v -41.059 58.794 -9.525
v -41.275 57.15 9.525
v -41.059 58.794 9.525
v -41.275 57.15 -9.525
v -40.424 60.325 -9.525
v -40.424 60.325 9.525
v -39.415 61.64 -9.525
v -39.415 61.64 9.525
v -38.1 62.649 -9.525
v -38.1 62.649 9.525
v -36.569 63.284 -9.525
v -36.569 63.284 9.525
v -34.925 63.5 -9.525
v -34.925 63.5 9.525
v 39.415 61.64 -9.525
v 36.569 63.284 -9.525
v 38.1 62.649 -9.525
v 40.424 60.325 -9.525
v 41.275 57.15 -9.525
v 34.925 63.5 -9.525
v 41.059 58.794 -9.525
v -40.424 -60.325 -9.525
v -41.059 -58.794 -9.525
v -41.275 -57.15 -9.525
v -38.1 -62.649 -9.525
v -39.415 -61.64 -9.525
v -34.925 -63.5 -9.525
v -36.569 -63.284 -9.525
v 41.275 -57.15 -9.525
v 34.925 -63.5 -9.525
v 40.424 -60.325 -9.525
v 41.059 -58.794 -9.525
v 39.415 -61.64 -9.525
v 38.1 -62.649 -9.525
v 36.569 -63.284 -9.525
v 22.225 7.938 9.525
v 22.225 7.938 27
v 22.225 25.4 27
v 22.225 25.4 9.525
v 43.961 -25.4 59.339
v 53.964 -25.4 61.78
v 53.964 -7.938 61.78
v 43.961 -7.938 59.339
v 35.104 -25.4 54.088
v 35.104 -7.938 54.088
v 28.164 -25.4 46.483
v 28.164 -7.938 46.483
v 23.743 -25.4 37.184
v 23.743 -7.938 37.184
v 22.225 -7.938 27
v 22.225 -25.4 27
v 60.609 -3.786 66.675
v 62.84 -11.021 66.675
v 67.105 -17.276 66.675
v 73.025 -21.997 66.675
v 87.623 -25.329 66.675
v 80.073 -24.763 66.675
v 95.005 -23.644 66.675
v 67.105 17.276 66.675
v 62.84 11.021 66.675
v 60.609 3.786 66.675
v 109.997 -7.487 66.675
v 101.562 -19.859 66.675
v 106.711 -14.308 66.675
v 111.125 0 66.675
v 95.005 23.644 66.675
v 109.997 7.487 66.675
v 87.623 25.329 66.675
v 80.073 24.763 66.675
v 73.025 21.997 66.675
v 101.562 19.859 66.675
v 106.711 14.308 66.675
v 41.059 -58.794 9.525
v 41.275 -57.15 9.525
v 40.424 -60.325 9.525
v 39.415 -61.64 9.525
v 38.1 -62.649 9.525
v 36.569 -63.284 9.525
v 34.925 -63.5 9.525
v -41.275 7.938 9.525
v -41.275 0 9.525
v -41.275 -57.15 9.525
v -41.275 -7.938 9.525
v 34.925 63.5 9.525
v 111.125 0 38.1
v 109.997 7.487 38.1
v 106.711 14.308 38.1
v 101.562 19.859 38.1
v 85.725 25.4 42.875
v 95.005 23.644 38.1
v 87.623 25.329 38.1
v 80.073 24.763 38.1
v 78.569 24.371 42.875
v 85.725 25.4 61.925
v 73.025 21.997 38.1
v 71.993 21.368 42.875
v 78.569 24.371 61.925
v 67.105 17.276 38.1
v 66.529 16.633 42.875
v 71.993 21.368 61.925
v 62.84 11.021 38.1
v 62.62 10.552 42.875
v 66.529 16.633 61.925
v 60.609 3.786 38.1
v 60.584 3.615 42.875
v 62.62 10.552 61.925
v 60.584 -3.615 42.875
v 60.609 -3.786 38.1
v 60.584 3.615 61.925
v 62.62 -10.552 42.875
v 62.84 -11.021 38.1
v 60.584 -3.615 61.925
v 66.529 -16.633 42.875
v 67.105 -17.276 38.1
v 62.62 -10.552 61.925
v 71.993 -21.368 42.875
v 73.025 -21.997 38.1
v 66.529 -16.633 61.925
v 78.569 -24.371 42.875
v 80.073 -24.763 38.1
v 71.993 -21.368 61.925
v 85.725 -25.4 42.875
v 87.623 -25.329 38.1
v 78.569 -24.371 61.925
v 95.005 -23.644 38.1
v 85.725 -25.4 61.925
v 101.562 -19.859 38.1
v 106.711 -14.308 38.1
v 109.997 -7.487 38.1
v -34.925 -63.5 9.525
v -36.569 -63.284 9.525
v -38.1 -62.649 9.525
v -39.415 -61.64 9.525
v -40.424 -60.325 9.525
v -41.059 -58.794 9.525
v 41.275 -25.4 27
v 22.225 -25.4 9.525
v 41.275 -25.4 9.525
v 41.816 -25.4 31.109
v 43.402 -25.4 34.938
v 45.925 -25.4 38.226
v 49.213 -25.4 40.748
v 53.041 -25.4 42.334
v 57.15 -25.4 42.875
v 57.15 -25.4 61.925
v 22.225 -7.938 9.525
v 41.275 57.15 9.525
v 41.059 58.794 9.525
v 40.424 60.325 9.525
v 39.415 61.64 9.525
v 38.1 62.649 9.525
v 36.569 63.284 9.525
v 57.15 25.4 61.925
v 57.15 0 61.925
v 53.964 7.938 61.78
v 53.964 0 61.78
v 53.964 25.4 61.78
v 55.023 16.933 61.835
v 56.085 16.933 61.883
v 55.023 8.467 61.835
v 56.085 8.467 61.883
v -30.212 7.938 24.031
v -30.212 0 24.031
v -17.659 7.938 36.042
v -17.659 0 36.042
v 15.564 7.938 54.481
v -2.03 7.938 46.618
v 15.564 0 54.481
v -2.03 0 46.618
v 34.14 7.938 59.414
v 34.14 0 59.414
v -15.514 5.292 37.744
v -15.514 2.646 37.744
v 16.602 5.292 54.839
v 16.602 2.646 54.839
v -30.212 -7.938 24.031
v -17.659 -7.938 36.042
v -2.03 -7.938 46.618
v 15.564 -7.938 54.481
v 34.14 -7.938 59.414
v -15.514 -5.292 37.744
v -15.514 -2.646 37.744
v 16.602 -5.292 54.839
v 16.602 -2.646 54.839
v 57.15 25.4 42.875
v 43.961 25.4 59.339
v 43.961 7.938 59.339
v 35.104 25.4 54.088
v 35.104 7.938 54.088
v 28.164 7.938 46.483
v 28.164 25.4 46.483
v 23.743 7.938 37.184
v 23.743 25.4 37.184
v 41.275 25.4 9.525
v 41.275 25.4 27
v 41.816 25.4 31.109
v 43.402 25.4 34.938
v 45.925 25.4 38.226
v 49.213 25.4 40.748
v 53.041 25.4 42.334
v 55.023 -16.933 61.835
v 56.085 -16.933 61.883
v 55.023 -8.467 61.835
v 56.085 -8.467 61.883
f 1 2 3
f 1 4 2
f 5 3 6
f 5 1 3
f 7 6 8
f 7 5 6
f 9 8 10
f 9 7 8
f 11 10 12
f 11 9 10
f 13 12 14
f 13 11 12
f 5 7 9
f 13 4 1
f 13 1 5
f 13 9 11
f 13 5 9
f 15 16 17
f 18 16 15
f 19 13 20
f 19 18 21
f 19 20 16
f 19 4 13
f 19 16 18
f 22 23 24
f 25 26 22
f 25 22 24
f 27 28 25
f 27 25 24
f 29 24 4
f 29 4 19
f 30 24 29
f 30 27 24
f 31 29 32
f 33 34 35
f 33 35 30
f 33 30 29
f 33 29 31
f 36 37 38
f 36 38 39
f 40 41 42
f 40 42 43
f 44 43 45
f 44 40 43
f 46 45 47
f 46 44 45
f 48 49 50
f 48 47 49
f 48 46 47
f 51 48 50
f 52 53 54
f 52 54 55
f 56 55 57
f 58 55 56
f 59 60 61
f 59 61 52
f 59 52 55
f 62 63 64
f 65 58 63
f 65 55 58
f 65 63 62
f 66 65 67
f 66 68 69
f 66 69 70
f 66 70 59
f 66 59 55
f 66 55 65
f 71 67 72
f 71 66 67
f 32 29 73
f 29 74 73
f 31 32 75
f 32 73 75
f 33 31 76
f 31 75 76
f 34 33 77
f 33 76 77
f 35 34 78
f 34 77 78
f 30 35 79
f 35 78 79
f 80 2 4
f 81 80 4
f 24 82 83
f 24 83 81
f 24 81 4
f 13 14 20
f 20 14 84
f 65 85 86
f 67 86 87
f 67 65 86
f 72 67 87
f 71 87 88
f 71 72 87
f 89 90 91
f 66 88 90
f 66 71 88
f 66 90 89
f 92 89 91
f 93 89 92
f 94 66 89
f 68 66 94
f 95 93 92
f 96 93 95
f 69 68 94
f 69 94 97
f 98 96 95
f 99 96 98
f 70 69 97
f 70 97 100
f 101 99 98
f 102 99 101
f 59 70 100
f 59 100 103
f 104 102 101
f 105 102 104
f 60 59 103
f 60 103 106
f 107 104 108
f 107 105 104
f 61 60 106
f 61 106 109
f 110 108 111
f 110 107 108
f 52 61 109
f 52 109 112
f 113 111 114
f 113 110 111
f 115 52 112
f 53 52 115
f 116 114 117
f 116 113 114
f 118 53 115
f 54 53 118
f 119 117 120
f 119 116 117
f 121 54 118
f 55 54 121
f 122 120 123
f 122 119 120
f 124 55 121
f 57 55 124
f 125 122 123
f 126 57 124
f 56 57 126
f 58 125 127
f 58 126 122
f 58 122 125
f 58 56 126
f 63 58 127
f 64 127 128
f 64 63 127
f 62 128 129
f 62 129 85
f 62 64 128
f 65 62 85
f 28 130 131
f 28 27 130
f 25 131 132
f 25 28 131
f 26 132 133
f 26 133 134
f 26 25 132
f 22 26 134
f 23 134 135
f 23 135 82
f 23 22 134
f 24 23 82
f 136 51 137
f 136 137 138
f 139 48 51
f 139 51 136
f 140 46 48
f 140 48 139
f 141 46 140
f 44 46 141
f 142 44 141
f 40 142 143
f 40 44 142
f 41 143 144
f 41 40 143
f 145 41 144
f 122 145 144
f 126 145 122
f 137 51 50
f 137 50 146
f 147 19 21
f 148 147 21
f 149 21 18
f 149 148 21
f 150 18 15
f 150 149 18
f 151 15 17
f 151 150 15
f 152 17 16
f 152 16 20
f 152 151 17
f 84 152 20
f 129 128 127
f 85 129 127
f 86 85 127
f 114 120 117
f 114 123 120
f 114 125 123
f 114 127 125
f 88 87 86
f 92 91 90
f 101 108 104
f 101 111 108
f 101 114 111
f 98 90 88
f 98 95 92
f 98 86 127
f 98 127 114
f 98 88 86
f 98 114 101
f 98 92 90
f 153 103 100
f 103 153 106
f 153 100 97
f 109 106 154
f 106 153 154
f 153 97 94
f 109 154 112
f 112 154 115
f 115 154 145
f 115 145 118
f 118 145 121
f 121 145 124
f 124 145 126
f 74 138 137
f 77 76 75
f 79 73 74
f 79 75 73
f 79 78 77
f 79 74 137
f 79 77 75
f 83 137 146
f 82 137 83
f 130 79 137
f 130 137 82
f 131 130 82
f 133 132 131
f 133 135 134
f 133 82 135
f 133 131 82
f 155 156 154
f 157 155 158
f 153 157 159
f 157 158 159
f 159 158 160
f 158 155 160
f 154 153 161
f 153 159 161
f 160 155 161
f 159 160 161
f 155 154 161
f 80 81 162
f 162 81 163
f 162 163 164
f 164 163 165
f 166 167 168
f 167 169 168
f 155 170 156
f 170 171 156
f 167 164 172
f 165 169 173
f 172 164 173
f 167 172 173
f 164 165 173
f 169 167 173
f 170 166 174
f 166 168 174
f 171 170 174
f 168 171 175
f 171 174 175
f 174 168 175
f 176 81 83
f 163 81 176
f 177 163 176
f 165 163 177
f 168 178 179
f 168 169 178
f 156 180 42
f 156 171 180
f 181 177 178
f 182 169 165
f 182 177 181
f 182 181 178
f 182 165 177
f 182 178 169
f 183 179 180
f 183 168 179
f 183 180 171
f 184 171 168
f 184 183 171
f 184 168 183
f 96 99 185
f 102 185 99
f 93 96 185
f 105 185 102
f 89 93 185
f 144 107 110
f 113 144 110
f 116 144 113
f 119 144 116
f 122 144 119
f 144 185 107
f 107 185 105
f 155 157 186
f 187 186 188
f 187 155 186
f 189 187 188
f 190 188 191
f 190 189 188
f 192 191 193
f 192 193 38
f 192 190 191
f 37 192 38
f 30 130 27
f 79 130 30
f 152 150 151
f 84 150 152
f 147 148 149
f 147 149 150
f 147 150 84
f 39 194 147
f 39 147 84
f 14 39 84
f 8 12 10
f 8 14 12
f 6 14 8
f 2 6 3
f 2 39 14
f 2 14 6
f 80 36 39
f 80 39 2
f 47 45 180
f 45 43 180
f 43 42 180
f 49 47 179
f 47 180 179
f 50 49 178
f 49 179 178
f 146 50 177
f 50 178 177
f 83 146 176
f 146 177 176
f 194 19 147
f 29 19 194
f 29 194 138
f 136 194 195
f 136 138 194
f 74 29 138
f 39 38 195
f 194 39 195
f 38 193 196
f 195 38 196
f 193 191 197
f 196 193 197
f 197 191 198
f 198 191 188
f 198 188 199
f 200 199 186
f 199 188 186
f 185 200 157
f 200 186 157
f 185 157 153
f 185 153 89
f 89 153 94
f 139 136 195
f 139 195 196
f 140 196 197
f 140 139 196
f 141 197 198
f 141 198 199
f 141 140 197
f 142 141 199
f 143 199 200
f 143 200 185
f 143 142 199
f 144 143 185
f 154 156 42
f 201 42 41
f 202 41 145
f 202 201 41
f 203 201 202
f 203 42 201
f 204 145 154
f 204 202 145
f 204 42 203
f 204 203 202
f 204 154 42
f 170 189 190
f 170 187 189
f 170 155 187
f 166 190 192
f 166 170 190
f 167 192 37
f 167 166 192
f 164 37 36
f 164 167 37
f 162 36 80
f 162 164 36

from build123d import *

# Parameters (mm, degrees)
F1_DEPTH = 63.5
F2_DEPTH = 25.4
F3_DEPTH = 7.9375
F0_W     = 25.4
F0_H     = 19.05
F4_DEPTH = 25.4
F6_R     = 6.35
F7_R     = 6.35


with BuildPart() as f1:
    # F0 (on Front) → F1 (new body, symmetric)
    with BuildSketch(Plane.XZ):
        Polygon((-41.275, 9.525), (-41.275, -9.525), (41.275, -9.525), (41.275, 9.525), (22.225, 9.525), align=None)
    extrude(amount=F1_DEPTH, both=True)

    # F0 (on Front) → F2 (join, symmetric)
    with BuildSketch(Plane.XZ):
        with BuildLine():
            Line((22.225, 9.525), (41.275, 9.525))
            Line((41.275, 9.525), (41.275, 27.0002))
            ThreePointArc((41.275, 27.0002), (45.9246798487, 38.2255201513), (57.15, 42.8752))
            Line((57.15, 42.8752), (60.325, 42.8752))
            Line((60.325, 42.8752), (60.325, 61.9252))
            Line((60.325, 61.9252), (57.15, 61.9252))
            add(Edge.make_bspline(
                [(53.9637073278, 61.7795496777), (55.021415818, 61.8378973507), (56.0835450938, 61.8864198253), (57.15, 61.9252)],
                knots=[108.6046989527, 108.6046989527, 108.6046989527, 108.6046989527, 111.5045361635, 111.5045361635, 111.5045361635, 111.5045361635], degree=3))
            ThreePointArc((53.9637073278, 61.7795496777), (31.3523557609, 50.5424423892), (22.225, 27.0002))
            Line((22.225, 27.0002), (22.225, 9.525))
        make_face()
    extrude(amount=F2_DEPTH, both=True)

    # F0 (on Front) → F3 (join, symmetric)
    with BuildSketch(Plane.XZ):
        with BuildLine():
            add(Edge.make_bspline(
                [(-41.275, 9.525), (-19.0620616146, 43.6277397004), (14.35041051, 59.5943127151), (53.9637073278, 61.7795496777)],
                knots=[0, 0, 0, 0, 108.6046989527, 108.6046989527, 108.6046989527, 108.6046989527], degree=3))
            Line((-41.275, 9.525), (22.225, 9.525))
            Line((22.225, 9.525), (22.225, 27.0002))
            ThreePointArc((22.225, 27.0002), (31.3523557609, 50.5424423892), (53.9637073278, 61.7795496777))
        make_face()
    extrude(amount=F3_DEPTH, both=True)

    # F0 (on Front) → F4 (join, symmetric)
    with BuildSketch(Plane.XZ):
        with Locations((73.025, 52.4002)):
            Rectangle(F0_W, F0_H)
    extrude(amount=F4_DEPTH, both=True)

    # F0 (on Front) → F5 (revolve)
    with BuildSketch(Plane.XZ):
        Polygon((85.725, 66.675), (85.725, 61.9252), (85.725, 42.8752), (85.725, 38.1), (111.125, 38.1), (111.125, 66.675), align=None)
    revolve(axis=Axis((85.725, 0, 52.3875), (0, 0, 1)))

    # F6
    f6_edges = [f1.edges().sort_by_distance(p)[0] for p in [
        (-41.275, -63.5, 0),
        (41.275, -63.5, 0),
        (41.275, 63.5, 0),
    ]]
    fillet(f6_edges, radius=F6_R)

    # F7
    f7_edges = [f1.edges().sort_by_distance(p)[0] for p in [
        (-41.275, 63.5, 0),
    ]]
    fillet(f7_edges, radius=F7_R)


solid = f1.part
